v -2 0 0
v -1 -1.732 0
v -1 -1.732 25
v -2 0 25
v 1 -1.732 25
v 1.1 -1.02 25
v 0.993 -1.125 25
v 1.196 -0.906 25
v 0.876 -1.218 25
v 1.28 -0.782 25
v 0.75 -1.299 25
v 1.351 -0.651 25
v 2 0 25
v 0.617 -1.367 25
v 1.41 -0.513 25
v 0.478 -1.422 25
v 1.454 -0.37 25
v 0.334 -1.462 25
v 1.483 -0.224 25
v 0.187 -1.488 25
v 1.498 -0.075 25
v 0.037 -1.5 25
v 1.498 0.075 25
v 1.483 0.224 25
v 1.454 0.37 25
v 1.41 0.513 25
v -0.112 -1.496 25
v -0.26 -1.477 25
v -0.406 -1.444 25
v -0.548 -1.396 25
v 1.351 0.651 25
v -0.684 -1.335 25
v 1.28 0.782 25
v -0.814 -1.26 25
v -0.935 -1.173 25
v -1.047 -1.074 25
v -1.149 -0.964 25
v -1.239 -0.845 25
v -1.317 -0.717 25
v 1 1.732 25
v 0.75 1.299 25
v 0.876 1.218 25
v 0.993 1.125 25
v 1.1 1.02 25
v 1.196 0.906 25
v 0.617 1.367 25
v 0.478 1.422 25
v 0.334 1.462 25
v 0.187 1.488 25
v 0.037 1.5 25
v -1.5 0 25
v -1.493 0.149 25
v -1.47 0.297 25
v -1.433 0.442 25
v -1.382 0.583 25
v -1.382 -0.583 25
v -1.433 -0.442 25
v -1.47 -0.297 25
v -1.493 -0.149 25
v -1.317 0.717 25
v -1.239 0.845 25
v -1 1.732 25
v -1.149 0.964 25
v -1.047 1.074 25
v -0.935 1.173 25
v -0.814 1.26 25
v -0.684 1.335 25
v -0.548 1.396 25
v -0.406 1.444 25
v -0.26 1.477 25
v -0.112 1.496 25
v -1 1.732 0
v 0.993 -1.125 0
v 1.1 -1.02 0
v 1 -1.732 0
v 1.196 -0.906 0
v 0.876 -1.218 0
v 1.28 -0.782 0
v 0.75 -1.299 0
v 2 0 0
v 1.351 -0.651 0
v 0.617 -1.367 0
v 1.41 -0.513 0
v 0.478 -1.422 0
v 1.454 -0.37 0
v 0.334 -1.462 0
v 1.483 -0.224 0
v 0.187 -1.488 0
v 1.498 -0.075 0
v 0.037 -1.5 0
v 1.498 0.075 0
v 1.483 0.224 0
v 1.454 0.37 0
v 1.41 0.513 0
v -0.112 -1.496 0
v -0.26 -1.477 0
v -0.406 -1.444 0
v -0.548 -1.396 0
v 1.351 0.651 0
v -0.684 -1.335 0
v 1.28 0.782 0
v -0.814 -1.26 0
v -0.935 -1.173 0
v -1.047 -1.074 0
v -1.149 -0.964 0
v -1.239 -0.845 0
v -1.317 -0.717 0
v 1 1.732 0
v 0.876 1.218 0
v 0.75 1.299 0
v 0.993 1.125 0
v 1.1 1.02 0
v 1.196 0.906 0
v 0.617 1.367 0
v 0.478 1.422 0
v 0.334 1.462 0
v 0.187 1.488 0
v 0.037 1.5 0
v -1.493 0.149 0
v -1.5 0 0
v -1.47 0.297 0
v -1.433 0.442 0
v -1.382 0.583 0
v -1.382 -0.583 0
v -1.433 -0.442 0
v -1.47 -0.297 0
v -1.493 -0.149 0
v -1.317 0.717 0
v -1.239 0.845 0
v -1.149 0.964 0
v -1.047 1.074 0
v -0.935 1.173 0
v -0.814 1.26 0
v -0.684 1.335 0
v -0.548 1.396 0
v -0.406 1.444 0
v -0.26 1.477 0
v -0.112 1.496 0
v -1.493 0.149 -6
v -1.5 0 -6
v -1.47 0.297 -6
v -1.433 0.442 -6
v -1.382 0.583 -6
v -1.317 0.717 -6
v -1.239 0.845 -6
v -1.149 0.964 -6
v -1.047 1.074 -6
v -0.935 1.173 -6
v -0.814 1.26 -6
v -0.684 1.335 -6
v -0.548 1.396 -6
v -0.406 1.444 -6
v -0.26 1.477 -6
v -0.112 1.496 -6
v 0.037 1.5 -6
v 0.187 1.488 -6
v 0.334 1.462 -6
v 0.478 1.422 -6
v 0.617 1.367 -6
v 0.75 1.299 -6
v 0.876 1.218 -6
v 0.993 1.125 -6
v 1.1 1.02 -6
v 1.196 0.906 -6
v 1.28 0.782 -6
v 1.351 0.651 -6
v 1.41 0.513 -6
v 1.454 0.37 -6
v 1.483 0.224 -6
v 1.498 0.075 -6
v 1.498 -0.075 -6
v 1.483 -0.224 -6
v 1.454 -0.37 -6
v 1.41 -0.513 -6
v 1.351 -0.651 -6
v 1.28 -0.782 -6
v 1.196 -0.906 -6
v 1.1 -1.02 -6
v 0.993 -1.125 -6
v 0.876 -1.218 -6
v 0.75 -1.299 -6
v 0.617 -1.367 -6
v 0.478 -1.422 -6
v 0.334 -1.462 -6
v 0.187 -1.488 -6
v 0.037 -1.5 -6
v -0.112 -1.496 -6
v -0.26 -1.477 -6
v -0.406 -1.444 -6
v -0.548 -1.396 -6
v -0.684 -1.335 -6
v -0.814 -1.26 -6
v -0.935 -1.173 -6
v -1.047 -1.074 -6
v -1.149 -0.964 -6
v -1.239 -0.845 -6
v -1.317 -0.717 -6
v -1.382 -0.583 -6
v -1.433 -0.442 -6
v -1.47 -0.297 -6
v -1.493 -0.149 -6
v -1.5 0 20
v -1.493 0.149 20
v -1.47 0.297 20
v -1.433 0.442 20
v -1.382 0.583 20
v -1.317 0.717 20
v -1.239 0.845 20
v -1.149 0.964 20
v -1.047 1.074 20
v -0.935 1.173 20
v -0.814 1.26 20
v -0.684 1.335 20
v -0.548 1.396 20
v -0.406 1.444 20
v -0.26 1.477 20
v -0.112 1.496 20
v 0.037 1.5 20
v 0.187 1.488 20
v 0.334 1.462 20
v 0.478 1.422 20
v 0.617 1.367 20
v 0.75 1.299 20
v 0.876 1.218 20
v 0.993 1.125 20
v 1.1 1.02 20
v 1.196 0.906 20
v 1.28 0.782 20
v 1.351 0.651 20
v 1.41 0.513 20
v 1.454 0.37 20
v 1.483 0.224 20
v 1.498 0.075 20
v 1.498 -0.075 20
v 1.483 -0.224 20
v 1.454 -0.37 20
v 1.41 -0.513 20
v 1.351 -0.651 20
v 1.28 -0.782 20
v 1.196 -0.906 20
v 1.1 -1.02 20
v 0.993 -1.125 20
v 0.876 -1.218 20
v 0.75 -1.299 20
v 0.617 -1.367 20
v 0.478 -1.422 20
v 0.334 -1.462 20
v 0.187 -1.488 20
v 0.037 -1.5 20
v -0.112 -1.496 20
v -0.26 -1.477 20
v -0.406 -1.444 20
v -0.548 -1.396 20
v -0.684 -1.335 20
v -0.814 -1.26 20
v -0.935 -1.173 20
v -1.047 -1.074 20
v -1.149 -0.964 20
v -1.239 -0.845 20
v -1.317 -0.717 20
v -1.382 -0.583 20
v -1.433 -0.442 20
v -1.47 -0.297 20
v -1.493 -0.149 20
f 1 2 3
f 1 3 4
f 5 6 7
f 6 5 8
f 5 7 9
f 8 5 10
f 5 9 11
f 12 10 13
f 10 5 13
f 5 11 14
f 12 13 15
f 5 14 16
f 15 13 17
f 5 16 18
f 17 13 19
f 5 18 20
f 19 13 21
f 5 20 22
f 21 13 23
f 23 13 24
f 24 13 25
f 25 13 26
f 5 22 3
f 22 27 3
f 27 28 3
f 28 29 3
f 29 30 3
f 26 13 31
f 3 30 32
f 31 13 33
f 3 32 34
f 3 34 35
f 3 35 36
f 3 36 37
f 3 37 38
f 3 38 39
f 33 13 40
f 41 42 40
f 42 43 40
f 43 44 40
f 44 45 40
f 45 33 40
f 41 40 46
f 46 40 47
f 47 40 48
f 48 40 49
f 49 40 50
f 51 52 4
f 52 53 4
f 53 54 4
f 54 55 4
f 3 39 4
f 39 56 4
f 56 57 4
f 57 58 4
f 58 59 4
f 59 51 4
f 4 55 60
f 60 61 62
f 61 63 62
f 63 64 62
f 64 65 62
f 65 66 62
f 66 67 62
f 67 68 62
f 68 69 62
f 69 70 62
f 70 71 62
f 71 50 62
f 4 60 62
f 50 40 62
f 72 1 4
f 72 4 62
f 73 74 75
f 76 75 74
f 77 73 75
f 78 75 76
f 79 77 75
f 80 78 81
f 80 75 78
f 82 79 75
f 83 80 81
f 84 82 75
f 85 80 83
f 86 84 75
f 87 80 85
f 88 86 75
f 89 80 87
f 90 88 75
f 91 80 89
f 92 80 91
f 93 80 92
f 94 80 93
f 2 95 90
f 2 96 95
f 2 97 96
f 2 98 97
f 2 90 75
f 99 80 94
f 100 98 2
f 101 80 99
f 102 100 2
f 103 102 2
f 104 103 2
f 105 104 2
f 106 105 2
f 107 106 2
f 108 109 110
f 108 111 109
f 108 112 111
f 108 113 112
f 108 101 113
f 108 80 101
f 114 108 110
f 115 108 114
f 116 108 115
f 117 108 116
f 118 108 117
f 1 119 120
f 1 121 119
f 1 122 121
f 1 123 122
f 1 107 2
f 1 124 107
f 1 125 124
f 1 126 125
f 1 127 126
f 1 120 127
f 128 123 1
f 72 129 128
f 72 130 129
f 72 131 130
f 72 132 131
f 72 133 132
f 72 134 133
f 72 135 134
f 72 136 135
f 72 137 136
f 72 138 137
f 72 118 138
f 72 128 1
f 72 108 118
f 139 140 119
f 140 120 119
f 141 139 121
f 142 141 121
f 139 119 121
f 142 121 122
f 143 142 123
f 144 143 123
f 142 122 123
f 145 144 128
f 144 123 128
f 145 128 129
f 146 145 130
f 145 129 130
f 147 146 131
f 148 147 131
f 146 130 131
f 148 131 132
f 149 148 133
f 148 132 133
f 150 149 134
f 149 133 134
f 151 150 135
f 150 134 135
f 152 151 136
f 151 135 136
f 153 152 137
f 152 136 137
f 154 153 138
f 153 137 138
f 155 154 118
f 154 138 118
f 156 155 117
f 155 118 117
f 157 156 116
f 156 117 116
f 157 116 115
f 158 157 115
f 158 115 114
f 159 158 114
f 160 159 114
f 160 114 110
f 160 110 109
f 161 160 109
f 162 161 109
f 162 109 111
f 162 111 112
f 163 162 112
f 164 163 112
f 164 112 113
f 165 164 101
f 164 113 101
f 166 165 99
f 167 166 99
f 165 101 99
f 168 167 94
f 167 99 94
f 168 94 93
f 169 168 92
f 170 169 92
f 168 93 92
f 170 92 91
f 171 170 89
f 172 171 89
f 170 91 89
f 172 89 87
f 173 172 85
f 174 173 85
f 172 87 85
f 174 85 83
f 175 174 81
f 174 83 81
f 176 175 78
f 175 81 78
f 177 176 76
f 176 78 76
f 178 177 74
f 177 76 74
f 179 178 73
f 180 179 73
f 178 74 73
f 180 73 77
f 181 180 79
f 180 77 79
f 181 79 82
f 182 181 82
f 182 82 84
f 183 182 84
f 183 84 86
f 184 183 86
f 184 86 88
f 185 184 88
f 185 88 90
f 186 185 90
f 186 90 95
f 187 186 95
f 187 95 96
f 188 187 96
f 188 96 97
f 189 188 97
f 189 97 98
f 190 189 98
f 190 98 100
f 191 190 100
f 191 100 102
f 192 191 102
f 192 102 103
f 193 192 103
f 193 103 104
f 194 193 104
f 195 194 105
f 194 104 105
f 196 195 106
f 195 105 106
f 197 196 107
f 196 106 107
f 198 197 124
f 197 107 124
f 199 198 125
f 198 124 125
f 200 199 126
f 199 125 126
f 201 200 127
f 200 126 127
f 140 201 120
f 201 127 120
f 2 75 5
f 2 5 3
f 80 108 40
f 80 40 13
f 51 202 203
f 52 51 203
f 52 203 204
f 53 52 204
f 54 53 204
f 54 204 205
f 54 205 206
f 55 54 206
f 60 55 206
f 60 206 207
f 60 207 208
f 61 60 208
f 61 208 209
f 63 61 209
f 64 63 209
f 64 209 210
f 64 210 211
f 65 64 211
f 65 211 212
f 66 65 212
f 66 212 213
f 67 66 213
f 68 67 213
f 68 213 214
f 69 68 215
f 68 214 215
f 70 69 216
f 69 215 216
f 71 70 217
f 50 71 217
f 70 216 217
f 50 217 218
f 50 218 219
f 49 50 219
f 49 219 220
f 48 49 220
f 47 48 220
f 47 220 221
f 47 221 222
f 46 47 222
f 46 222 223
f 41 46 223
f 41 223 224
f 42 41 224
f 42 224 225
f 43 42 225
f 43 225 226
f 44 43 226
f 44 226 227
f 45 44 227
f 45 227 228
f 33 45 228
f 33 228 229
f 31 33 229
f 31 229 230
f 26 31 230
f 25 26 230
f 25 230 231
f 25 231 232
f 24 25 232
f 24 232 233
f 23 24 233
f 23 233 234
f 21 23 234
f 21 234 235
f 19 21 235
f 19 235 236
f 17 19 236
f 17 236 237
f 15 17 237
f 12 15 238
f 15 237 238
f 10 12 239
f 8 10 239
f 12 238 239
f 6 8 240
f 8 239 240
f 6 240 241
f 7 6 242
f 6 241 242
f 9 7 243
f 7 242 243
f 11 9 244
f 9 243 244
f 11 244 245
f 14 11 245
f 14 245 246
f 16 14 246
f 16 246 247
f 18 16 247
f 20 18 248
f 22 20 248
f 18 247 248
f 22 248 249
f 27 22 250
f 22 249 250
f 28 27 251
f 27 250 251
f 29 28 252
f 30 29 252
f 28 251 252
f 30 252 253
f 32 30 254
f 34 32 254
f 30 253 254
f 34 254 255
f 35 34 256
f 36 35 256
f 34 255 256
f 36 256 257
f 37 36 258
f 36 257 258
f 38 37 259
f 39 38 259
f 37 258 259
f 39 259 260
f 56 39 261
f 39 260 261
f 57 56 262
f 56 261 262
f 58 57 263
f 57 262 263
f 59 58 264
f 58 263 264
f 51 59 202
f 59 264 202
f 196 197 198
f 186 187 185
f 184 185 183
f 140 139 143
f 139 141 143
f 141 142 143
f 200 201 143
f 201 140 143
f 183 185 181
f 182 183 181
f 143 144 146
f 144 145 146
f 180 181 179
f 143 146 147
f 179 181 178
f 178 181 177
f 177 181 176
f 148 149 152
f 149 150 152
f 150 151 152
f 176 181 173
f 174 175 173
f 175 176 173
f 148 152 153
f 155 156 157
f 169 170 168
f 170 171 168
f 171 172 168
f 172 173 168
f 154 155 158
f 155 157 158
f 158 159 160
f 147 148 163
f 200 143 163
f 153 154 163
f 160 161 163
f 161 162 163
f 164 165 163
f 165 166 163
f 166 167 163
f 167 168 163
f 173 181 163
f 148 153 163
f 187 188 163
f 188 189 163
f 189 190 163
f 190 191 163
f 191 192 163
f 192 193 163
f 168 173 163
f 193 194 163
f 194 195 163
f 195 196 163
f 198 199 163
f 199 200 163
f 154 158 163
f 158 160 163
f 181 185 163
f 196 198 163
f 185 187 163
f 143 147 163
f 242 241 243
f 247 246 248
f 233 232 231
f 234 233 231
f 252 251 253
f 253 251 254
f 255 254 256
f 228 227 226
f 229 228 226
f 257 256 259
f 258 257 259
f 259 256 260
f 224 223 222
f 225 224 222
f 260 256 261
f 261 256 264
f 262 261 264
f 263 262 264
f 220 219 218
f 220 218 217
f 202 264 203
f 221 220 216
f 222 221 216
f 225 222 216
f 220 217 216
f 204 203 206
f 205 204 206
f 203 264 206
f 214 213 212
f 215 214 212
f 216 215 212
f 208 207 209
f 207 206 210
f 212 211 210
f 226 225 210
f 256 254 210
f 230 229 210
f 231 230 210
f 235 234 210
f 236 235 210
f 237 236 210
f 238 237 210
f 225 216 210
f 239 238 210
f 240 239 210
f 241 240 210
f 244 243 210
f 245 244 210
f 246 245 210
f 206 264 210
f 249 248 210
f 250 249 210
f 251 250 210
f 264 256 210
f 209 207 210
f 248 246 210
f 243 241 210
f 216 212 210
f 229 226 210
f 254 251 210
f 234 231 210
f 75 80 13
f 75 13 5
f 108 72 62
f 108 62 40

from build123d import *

# Parameters (mm, degrees)
EXTRUDE_1_DEPTH           = 25
SKETCH_2_W                = 1.5
SKETCH_2_H                = 6
HOLE_WIZARD_3_0_3_1_D     = 3
HOLE_WIZARD_3_0_3_1_DEPTH = 5


with BuildPart() as part:
    # 草图1 → 凸台-拉伸1 (new body)
    with BuildSketch(Plane(origin=(0, 0, 0), x_dir=(-1, 0, 0), z_dir=(0, 0, -1))):
        Polygon((1, -1.732050808), (2, 0), (1, 1.732050808), (-1, 1.732050808), (-2, 0), (-1, -1.732050808), align=None)
    extrude(amount=-EXTRUDE_1_DEPTH)

    # 草图2 → 旋转1 (revolve)
    with BuildSketch(Plane.XZ, mode=Mode.PRIVATE) as revolve_1_sk:
        with Locations((0.75, -3)):
            Rectangle(SKETCH_2_W, SKETCH_2_H)
    revolve(revolve_1_sk.sketch.rotate(Axis((0, 0, 0), (0, 0, -1)), 180), axis=Axis((0, 0, 0), (0, 0, -1)))

    # Ø3.0 (3) 直径孔1
    with Locations(Plane.XY.offset(25)):
        with Locations((0, 0)):
            Hole(HOLE_WIZARD_3_0_3_1_D / 2, depth=HOLE_WIZARD_3_0_3_1_DEPTH)


solid = part.part
